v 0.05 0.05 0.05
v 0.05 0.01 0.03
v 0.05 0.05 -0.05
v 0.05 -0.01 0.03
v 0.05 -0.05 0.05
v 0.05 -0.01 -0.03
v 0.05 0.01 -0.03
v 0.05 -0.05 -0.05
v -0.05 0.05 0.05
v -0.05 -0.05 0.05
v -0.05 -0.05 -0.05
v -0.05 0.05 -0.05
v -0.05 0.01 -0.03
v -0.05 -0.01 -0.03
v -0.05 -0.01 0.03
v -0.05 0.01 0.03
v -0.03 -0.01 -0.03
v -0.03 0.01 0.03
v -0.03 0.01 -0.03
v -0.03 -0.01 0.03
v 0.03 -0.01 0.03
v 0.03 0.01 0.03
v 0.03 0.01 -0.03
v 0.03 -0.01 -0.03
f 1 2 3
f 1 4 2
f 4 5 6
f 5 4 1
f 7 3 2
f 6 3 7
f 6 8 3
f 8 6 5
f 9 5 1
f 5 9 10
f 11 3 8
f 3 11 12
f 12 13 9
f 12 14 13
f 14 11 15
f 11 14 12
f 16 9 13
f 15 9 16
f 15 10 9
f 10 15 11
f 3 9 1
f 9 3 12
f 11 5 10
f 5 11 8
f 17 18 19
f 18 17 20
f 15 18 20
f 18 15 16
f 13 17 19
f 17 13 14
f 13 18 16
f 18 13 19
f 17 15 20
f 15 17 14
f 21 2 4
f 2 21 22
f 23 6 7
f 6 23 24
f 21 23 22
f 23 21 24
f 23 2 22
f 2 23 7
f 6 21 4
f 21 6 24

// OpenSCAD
$fn=64;

Lx = 0.1;
Ly = 0.1;
Lz = 0.1;

step_x = 0.03;
step_y = 0.04;

notch_depth = 0.02;
notch_width = 0.05;
notch_height = 0.06;
notch_side_thickness = 0.015;

module l_block() {
    union() {
        translate([0, 0, 0]) cube([Lx, Ly, Lz], center=false);
        translate([Lx - step_x, Ly - step_y, 0]) cube([step_x, step_y, Lz], center=false);
    }
}

module u_notch_at_x(xpos) {
    translate([xpos, (Ly - notch_width)/2, (Lz - notch_height)/2])
        cube([notch_depth, notch_width, notch_height], center=false);

    translate([xpos, (Ly - notch_width)/2, (Lz - notch_height)/2])
        cube([notch_depth, notch_side_thickness, notch_height], center=false);

    translate([xpos, (Ly + notch_width)/2 - notch_side_thickness, (Lz - notch_height)/2])
        cube([notch_depth, notch_side_thickness, notch_height], center=false);
}

module u_notch_cut(xpos) {
    union() {
        translate([xpos, (Ly - notch_width)/2 + notch_side_thickness, (Lz - notch_height)/2])
            cube([notch_depth, notch_width - 2*notch_side_thickness, notch_height], center=false);
    }
}

module part() {
    difference() {
        l_block();
        u_notch_cut(0);
        u_notch_cut(Lx - notch_depth);
    }
}

translate([-Lx/2, -Ly/2, -Lz/2]) part();
